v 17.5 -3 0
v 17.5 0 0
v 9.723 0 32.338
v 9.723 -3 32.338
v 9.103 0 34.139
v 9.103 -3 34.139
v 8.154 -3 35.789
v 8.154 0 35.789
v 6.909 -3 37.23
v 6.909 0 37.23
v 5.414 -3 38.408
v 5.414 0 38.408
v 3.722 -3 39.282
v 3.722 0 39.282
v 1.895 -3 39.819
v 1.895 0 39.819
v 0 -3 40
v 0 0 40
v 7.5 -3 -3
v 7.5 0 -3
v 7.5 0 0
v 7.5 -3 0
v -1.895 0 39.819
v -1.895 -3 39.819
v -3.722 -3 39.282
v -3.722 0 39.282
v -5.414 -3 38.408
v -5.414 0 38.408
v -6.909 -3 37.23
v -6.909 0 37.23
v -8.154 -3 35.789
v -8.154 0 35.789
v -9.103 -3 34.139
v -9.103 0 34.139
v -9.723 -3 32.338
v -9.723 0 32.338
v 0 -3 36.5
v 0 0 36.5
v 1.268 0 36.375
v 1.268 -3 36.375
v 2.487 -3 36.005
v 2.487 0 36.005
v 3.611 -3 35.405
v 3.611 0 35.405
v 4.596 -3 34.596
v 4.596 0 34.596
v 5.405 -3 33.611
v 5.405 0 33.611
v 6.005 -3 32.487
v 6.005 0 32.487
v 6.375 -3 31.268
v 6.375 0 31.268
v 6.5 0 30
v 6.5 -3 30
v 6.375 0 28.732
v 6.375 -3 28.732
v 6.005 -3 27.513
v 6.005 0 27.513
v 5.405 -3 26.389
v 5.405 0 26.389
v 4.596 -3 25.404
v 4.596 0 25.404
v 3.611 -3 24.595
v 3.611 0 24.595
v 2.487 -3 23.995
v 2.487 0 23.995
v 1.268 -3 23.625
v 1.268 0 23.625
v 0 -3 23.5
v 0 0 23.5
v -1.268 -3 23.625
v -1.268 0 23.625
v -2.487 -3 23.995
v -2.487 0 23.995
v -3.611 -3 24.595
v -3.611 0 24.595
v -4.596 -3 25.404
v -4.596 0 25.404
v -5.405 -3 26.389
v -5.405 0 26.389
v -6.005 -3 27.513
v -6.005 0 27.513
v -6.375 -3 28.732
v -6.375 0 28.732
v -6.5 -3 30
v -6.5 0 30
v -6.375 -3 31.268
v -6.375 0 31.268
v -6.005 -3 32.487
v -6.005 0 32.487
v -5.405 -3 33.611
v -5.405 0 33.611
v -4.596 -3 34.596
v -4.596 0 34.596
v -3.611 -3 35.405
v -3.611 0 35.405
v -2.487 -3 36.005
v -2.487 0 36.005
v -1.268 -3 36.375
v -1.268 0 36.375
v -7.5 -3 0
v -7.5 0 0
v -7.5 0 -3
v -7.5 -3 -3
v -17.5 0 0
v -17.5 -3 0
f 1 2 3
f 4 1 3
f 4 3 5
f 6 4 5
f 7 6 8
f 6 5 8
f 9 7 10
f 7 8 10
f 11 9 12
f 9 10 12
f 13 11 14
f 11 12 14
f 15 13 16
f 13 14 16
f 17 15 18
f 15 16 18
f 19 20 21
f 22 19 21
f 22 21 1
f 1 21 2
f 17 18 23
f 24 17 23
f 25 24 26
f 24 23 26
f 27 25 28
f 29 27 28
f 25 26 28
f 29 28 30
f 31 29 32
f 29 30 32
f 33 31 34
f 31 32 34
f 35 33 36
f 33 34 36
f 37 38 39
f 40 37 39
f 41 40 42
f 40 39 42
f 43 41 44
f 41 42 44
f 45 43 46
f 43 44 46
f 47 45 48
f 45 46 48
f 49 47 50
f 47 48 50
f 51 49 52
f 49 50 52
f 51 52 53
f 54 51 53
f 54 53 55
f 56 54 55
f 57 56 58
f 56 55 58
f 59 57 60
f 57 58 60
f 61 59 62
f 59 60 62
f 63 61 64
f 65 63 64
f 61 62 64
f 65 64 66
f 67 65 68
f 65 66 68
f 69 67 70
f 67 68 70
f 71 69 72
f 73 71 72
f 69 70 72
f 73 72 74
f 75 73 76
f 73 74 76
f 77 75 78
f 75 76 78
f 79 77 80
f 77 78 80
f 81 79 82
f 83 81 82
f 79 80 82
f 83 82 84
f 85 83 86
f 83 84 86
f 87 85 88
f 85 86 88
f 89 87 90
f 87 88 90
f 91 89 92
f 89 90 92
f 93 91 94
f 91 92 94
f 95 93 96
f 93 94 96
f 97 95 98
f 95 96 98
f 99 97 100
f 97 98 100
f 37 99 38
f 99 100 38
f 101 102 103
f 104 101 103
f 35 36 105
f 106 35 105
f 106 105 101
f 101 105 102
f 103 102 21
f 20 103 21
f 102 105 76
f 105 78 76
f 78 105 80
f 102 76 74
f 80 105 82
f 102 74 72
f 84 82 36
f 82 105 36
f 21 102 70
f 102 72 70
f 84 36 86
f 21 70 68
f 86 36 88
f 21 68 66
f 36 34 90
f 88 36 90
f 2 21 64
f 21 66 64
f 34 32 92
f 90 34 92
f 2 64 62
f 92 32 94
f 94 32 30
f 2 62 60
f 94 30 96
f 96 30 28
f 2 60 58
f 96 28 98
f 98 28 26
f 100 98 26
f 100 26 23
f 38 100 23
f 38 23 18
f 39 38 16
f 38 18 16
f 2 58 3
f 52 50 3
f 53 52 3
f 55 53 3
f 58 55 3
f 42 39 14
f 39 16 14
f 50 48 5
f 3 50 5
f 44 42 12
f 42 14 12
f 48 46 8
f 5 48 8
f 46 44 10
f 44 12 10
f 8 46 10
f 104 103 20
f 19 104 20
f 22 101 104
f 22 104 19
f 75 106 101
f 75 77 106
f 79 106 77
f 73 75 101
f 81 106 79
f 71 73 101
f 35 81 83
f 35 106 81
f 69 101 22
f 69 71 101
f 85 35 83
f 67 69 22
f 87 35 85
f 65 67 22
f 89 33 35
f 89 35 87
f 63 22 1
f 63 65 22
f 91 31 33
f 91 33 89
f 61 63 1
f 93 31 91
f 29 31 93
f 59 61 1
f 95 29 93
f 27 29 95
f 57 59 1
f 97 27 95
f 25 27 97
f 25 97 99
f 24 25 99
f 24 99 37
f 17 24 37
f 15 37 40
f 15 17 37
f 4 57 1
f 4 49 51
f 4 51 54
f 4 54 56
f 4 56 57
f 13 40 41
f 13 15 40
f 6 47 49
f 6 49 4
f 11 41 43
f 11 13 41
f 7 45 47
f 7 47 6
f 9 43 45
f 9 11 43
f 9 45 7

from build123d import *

# Parameters (mm, degrees)
F1_DEPTH = 3


with BuildPart() as f1:
    # F0 (on Front) → F1 (new body)
    with BuildSketch(Plane.XZ):
        with BuildLine():
            ThreePointArc((0, 40), (-6.189391, 37.85439), (-9.722778, 32.338287))
            Line((-9.722778, 32.338287), (-17.5, 0))
            Line((-17.5, 0), (-7.5, 0))
            Line((-7.5, 0), (-7.5, -3))
            Line((-7.5, -3), (0, -3))
            Line((0, -3), (7.5, -3))
            Line((7.5, -3), (7.5, 0))
            Line((7.5, 0), (17.5, 0))
            Line((17.5, 0), (9.722778, 32.338287))
            ThreePointArc((9.722778, 32.338287), (6.189391, 37.85439), (0, 40))
        make_face()
        with BuildLine():
            ThreePointArc((0, 23.5), (-6.5, 30), (0, 36.5))
            ThreePointArc((0, 36.5), (6.5, 30), (0, 23.5))
        make_face(mode=Mode.SUBTRACT)
    extrude(amount=F1_DEPTH)


solid = f1.part
